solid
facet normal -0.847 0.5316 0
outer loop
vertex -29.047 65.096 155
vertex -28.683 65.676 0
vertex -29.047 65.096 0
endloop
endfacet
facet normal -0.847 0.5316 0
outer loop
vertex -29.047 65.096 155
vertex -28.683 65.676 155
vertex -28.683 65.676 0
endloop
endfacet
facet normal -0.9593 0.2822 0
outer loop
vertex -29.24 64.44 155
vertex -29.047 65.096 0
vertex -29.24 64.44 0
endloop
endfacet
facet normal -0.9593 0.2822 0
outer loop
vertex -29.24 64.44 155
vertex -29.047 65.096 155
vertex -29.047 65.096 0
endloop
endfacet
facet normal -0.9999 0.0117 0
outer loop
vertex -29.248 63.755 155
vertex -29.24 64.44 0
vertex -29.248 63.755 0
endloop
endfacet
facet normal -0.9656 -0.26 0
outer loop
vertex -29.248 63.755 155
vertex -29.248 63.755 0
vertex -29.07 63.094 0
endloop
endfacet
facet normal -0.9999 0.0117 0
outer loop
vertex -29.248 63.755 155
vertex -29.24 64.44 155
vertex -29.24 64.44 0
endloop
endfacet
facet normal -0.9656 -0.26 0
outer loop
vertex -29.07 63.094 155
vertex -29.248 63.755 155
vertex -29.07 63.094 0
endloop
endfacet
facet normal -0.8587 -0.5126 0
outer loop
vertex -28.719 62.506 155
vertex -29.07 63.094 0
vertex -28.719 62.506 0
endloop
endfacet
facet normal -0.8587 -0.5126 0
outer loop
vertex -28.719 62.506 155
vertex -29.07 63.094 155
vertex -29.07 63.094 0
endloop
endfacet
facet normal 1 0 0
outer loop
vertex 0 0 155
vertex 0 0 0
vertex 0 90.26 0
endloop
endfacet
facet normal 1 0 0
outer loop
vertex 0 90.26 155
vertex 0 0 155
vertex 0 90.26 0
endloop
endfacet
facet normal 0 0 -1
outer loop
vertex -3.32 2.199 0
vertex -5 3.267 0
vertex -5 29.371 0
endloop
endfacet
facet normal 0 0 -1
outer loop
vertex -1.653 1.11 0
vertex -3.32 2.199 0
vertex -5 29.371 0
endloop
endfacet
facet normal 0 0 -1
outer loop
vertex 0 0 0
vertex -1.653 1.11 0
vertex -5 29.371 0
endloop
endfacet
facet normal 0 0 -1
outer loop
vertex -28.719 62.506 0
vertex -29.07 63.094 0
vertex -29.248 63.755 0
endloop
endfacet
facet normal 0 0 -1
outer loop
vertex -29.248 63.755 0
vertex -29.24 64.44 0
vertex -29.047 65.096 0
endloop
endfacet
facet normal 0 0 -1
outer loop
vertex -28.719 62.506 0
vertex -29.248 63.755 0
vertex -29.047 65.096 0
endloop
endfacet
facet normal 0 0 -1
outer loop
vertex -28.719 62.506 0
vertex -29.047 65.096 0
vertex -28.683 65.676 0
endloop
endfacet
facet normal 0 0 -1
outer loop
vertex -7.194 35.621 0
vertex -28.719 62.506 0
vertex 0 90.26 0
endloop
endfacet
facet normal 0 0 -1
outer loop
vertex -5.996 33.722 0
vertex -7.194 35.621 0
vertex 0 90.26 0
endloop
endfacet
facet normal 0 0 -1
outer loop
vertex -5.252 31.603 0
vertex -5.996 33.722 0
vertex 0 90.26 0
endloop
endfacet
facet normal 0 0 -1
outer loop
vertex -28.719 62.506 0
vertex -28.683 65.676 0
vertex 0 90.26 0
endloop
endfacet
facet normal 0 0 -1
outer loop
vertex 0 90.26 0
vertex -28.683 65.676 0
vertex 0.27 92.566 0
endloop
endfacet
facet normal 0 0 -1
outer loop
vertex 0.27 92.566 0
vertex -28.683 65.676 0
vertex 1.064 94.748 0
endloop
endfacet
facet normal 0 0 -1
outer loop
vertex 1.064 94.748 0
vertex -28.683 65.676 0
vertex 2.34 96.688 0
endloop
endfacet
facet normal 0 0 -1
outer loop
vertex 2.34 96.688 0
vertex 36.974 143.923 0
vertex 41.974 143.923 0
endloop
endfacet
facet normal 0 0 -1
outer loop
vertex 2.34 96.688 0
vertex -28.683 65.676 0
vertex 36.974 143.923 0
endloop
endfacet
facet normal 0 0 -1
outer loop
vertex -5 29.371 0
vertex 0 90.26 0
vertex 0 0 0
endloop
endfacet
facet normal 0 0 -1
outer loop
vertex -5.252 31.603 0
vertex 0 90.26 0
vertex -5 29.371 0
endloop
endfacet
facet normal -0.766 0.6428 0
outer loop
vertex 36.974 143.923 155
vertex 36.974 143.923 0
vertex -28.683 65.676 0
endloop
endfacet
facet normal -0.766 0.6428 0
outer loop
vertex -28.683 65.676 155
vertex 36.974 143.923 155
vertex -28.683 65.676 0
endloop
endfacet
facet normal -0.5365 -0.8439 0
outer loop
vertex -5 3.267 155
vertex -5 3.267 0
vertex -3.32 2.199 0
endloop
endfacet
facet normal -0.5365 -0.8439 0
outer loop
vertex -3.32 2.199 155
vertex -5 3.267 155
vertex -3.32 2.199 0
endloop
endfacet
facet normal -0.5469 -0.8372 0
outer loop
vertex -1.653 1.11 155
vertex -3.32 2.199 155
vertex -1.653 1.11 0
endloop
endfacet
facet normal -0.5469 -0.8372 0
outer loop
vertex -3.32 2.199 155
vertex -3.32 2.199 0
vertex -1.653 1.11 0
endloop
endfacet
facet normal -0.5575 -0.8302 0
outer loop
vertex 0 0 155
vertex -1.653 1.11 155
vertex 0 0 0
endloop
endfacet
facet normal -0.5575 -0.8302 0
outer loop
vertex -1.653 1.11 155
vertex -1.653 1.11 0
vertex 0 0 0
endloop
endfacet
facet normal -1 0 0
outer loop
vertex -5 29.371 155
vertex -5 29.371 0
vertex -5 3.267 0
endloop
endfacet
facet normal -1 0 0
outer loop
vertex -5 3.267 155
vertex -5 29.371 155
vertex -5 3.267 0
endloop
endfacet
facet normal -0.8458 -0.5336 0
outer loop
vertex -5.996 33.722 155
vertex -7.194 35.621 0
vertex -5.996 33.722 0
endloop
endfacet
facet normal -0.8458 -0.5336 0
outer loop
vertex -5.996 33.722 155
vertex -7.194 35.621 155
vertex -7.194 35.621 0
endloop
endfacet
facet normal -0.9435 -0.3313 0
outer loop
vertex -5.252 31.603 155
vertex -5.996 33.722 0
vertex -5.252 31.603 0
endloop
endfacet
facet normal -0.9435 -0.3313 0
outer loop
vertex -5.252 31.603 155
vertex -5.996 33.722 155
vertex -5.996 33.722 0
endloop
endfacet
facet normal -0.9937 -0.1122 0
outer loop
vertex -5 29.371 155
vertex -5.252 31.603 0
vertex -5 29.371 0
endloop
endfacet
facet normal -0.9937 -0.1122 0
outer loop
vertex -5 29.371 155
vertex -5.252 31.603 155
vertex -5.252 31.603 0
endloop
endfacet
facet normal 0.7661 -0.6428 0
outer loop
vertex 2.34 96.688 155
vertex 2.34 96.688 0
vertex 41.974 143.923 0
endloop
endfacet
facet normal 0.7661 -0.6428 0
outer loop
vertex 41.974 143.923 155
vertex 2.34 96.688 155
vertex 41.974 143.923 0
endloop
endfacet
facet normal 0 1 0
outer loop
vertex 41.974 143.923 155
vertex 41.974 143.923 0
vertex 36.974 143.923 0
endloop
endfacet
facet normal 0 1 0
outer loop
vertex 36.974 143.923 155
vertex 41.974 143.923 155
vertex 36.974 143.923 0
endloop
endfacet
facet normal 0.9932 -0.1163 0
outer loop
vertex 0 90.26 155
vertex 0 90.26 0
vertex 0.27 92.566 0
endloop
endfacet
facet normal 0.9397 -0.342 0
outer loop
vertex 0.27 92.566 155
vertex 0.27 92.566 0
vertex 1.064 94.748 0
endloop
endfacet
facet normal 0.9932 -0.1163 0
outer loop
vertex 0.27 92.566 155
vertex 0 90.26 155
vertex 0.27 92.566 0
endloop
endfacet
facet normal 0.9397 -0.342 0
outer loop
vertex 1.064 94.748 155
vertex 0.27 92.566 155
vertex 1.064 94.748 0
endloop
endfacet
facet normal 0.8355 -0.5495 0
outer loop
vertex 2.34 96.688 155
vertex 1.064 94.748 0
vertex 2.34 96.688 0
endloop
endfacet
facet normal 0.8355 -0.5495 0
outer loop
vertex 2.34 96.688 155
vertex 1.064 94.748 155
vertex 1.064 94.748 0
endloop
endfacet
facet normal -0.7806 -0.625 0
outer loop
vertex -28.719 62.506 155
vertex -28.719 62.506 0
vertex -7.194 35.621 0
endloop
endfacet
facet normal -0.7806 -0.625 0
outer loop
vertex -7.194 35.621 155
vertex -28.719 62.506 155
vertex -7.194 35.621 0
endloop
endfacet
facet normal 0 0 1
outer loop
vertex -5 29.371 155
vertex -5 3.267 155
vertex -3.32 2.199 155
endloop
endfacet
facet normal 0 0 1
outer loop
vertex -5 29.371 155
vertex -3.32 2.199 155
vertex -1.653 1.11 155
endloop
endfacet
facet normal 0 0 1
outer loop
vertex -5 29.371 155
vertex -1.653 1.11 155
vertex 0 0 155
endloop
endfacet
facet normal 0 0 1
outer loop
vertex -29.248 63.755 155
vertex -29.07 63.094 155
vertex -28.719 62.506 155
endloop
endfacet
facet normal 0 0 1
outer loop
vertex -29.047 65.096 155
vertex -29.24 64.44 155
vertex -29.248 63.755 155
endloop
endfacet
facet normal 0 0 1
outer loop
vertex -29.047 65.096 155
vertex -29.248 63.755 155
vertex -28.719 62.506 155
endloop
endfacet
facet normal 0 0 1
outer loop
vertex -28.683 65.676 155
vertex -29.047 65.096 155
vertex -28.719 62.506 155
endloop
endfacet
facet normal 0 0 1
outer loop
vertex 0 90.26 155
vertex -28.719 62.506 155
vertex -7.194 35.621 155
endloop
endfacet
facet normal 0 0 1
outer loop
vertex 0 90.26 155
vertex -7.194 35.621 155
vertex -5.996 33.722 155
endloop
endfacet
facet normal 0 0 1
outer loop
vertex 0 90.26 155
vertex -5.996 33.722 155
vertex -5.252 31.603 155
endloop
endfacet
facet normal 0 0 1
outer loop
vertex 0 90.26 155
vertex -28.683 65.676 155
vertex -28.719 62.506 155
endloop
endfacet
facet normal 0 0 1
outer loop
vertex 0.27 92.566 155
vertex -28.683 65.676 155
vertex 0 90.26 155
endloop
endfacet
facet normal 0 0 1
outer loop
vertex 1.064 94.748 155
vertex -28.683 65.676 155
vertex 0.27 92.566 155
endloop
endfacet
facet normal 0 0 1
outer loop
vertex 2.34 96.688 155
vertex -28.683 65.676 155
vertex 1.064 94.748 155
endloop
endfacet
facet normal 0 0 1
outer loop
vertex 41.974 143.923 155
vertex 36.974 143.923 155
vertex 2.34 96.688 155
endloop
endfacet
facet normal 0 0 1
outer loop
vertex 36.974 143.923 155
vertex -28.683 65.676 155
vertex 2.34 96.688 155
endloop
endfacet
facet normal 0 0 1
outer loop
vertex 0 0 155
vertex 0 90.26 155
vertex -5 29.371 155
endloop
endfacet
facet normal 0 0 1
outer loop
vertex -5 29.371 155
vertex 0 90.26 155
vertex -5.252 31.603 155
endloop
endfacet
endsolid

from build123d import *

# Parameters (mm, degrees)
FUNNEL_RIGHT_SIDE_DEPTH = 155
FILLET2_R               = 10
FILLET3_R               = 2.5


with BuildPart() as part:
    # Sketch1 → Funnel - Right Side (new body)
    with BuildSketch(Plane.XY):
        with BuildLine():
            Line((0, 0), (0, 93.9))
            Line((0, 93.9), (41.974030913, 143.922702136))
            Line((41.974030913, 143.922702136), (36.974030913, 143.922702136))
            Line((36.974030913, 143.922702136), (-30, 64.106160185))
            Line((-30, 64.106160185), (-5, 32.881170193))
            Line((-5, 32.881170193), (-5, 3.266851564))
            ThreePointArc((-5, 3.266851564), (-2.484755158, 1.656758403), (0, 0))
        make_face()
    extrude(amount=FUNNEL_RIGHT_SIDE_DEPTH)

    # Fillet2
    fillet2_edges = [part.edges().sort_by_distance(p)[0] for p in [
        (-5, 32.881170193, 77.5),
        (0, 93.9, 77.5),
    ]]
    fillet(fillet2_edges, radius=FILLET2_R)

    # Fillet3
    fillet3_edges = [part.edges().sort_by_distance(p)[0] for p in [
        (-30, 64.106160185, 77.5),
    ]]
    fillet(fillet3_edges, radius=FILLET3_R)


solid = part.part
